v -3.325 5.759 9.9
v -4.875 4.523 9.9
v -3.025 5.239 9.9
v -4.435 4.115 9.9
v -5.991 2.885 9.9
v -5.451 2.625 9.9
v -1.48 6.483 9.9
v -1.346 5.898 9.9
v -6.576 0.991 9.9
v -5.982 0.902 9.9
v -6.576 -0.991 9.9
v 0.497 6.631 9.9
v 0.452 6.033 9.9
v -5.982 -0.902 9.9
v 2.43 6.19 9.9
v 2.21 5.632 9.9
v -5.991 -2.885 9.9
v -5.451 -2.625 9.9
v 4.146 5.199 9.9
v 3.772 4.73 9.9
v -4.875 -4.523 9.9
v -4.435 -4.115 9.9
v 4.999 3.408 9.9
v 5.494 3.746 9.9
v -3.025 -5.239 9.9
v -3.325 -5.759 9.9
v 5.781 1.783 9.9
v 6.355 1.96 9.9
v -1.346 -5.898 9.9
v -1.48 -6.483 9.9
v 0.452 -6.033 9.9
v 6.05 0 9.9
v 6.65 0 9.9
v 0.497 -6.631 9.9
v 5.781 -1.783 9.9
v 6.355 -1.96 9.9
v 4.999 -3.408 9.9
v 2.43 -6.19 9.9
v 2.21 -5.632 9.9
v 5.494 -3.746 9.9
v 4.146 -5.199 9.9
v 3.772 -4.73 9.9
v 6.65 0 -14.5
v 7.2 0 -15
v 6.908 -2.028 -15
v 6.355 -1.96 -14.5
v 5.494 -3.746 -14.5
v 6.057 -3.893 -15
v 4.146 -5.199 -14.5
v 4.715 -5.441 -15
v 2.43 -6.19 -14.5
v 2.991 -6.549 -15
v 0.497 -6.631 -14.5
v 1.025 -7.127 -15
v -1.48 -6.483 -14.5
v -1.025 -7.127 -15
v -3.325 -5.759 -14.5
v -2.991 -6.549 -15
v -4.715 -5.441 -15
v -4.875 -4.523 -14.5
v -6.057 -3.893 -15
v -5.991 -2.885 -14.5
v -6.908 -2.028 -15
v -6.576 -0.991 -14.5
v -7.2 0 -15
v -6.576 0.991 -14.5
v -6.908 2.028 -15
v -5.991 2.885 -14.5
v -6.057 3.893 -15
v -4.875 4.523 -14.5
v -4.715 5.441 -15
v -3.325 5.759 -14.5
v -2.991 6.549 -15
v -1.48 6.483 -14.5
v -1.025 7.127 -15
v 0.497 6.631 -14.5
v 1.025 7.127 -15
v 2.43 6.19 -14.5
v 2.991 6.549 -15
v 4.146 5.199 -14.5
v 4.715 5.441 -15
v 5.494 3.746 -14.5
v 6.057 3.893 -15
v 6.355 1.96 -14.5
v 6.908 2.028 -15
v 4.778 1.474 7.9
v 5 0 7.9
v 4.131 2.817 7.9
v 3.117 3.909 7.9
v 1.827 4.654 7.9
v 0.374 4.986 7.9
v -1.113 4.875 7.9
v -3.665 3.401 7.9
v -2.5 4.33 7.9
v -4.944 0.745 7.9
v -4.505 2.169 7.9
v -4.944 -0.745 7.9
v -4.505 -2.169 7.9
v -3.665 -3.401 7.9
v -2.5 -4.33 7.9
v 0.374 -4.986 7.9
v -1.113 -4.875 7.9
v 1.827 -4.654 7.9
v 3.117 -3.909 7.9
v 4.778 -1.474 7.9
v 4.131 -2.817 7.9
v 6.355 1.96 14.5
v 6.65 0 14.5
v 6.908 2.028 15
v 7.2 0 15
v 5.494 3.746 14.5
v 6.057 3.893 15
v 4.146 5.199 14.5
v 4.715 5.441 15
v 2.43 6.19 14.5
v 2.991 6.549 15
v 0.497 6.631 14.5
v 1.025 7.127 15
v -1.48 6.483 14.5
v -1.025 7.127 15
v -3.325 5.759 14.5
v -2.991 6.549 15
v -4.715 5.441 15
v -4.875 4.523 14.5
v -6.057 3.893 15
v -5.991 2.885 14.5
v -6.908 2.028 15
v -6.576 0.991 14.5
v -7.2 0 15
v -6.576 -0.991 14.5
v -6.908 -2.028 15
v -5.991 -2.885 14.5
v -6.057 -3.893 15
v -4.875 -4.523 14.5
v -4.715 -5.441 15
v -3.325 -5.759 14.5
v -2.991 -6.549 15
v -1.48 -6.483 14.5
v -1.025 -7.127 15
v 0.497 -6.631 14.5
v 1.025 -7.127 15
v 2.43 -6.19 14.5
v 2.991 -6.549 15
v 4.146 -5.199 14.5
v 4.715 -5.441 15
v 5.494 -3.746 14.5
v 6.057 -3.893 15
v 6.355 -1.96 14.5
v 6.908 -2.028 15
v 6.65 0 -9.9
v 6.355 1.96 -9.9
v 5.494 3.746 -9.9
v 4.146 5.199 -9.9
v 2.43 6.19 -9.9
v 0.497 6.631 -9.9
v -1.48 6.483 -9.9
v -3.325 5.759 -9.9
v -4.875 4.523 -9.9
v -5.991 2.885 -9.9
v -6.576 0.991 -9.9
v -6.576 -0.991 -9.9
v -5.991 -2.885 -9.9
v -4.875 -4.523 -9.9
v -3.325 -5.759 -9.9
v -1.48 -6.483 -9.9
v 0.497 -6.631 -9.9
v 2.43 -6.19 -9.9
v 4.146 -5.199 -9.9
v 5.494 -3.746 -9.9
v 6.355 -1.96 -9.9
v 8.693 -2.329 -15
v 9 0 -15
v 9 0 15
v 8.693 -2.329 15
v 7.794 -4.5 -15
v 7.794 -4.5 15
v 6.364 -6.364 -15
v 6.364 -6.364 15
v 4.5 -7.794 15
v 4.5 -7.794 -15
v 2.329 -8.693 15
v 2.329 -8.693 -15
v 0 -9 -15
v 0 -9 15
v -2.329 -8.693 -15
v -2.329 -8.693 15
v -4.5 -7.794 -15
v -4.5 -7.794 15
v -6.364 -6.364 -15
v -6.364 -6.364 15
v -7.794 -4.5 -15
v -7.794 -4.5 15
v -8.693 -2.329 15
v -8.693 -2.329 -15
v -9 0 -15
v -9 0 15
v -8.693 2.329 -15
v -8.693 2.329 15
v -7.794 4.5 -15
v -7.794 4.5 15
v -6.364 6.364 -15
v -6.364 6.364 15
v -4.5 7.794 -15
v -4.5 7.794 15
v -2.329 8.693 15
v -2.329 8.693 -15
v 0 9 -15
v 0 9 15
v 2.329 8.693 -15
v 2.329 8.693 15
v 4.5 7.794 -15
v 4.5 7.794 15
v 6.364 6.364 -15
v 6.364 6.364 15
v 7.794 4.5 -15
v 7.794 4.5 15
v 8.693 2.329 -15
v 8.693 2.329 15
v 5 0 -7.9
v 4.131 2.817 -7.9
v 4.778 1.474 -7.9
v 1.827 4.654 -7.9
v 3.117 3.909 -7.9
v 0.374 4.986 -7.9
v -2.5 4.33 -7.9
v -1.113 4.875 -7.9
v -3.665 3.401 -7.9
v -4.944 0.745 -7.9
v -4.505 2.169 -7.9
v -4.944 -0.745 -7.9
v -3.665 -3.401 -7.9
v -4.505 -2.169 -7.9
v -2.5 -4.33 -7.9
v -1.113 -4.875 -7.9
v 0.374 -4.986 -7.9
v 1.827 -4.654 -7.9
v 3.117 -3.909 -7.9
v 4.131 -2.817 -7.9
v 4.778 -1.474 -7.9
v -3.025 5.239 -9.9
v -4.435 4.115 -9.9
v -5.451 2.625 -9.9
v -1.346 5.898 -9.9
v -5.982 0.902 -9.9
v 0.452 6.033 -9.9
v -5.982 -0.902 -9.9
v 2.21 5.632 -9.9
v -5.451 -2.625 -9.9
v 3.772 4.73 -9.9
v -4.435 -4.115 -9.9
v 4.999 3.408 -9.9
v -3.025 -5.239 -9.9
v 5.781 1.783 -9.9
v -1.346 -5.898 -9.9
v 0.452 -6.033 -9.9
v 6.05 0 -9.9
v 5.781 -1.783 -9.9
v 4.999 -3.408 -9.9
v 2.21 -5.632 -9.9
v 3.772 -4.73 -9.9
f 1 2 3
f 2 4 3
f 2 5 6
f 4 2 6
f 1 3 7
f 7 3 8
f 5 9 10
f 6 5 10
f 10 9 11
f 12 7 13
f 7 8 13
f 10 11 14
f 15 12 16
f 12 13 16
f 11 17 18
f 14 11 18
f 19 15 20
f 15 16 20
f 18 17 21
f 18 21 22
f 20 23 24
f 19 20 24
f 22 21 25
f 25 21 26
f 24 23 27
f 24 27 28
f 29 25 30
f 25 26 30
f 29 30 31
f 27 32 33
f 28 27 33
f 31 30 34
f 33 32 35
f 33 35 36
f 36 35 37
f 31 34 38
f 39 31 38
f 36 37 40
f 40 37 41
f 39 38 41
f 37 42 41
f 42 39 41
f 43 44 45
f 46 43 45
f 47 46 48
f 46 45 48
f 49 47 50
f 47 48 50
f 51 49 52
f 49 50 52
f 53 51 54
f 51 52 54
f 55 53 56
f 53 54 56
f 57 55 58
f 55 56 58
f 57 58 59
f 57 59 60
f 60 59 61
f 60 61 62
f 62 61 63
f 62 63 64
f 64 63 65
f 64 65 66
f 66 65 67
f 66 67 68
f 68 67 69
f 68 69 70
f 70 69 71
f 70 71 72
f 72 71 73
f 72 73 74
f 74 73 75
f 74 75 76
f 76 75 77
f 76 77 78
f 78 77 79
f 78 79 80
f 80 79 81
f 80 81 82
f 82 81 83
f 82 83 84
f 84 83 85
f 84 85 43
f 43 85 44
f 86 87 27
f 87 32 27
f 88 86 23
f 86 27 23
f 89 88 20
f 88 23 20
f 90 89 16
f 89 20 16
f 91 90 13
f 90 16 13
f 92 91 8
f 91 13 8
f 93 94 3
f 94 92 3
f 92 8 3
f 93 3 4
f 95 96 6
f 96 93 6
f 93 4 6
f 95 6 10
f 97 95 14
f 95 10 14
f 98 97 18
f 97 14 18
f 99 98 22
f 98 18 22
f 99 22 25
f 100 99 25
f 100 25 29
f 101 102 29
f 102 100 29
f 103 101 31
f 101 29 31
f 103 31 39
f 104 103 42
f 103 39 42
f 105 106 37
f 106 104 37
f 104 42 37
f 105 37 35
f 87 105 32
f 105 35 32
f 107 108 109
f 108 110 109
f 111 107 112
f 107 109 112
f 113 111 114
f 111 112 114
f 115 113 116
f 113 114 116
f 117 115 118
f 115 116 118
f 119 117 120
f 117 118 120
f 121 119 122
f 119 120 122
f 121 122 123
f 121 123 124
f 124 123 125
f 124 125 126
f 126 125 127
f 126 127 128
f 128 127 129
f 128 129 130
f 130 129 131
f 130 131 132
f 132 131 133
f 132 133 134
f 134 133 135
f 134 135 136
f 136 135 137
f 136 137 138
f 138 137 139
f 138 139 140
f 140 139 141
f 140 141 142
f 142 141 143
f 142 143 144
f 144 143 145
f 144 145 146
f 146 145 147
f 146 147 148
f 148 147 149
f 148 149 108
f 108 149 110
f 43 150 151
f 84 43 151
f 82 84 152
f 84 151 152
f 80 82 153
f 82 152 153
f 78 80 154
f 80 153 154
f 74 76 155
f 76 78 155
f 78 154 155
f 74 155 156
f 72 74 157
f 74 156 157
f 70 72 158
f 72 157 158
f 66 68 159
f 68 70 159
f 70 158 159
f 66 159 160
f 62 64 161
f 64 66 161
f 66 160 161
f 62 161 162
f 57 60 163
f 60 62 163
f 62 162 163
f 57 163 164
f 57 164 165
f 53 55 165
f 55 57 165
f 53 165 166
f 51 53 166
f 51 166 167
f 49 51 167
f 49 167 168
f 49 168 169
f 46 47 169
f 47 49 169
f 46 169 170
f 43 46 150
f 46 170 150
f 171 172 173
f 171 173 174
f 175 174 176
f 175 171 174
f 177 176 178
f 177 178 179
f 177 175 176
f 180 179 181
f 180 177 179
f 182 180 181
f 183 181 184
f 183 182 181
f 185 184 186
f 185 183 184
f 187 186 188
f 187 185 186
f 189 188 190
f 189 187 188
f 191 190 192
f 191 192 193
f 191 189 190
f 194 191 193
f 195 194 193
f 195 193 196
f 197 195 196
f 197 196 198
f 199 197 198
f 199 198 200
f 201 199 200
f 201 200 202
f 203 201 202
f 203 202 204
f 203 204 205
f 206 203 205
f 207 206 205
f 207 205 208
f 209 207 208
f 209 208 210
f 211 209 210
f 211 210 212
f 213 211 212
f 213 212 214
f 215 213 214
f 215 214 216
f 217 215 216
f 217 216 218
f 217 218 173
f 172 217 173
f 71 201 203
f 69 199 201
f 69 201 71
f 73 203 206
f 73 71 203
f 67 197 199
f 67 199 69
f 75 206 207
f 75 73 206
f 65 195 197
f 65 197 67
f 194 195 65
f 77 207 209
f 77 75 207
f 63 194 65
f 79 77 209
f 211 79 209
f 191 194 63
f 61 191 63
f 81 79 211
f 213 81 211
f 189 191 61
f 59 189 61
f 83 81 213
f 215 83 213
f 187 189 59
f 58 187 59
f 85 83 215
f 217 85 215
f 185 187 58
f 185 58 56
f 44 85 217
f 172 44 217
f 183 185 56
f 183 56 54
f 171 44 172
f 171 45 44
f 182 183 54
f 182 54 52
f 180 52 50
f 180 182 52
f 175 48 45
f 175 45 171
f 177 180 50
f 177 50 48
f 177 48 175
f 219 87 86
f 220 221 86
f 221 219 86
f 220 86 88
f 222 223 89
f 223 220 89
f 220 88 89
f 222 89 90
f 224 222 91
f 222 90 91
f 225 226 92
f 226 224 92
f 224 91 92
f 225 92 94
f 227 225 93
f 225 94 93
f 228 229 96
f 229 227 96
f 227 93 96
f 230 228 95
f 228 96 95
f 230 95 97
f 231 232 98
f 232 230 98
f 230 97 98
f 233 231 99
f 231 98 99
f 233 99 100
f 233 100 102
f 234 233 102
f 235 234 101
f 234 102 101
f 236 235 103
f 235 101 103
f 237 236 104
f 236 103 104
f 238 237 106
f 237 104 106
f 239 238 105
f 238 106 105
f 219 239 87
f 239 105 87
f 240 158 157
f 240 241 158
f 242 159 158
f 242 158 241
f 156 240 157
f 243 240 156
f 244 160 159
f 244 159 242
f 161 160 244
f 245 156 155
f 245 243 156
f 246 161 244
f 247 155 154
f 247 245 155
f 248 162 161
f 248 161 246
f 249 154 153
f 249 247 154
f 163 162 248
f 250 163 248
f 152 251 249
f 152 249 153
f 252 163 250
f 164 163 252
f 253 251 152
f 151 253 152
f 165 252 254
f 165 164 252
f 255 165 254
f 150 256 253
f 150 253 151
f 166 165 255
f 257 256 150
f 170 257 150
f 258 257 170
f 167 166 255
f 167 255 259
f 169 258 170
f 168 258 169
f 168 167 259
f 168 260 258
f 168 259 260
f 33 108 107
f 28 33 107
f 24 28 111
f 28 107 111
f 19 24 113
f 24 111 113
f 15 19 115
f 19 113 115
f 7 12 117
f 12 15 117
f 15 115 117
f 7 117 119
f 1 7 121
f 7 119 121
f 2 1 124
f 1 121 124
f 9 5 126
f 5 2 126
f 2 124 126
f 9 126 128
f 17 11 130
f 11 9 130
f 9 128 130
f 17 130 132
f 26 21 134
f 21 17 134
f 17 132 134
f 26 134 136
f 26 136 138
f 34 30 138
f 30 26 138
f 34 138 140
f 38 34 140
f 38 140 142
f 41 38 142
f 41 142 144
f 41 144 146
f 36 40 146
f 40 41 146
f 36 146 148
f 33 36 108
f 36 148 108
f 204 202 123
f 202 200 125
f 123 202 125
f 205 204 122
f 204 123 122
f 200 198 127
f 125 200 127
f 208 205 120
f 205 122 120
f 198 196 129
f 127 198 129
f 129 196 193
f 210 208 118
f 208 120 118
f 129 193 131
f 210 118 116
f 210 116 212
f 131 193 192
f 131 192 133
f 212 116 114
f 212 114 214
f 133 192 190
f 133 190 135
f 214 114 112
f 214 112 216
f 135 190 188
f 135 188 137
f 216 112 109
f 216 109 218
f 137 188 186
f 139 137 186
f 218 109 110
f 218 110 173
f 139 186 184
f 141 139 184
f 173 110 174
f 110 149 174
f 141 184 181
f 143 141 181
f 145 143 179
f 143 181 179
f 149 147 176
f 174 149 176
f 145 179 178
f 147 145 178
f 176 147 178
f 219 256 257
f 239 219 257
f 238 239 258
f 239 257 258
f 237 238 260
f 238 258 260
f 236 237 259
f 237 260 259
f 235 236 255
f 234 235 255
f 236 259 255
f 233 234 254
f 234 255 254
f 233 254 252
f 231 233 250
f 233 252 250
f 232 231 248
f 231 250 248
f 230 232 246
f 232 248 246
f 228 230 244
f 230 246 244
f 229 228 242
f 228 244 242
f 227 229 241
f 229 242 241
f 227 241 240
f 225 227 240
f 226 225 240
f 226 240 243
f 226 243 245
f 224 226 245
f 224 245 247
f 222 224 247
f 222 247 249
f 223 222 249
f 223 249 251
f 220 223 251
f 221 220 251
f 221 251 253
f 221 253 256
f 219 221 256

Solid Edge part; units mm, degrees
revolve "RevolvedProtrusion1" [suppressed]
fillet "Round1" [suppressed]
revolve "RevolvedProtrusion2" [suppressed]
revolve "RevolvedProtrusion3" [suppressed]
sketch "Sketch1" plane through (0, 0, 0) normal (0, -1, 0) x (1, 0, 0)
  line L0 (9, 15) -> (9, -15)
  line L1 (9, -15) -> (7.2, -15)
  line L2 (7.2, -15) -> (6.65, -14.5)
  line L3 (6.65, -14.5) -> (6.65, -9.9)
  line L4 (6.65, -9.9) -> (6.05, -9.9)
  line L5 (5, -7.9) -> (6.05, -9.9)
  line L6 (5, -7.9) -> (5, 7.9)
  line L7 (6.05, 9.9) -> (5, 7.9)
  line L8 (6.05, 9.9) -> (6.65, 9.9)
  line L9 (6.65, 9.9) -> (6.65, 14.5)
  line L10 (6.65, 14.5) -> (7.2, 15)
  line L11 (7.2, 15) -> (9, 15)
  dimension "D1" = 0.6
  dimension "D2" = 2
  dimension "D3" = 1.8
  dimension "D4" = 0.5
  dimension "D5" = 30
  dimension "D6" = 5.1
  dimension "D7" = 6.65
  dimension "D8" = 5
  dimension "D9" = 9
  dimension "D10" = 6.65
revolve "RevolvedProtrusion4" add sketch "Sketch1" angle 360 about axis through (0, 0, 54) along (0, 0, -1)
